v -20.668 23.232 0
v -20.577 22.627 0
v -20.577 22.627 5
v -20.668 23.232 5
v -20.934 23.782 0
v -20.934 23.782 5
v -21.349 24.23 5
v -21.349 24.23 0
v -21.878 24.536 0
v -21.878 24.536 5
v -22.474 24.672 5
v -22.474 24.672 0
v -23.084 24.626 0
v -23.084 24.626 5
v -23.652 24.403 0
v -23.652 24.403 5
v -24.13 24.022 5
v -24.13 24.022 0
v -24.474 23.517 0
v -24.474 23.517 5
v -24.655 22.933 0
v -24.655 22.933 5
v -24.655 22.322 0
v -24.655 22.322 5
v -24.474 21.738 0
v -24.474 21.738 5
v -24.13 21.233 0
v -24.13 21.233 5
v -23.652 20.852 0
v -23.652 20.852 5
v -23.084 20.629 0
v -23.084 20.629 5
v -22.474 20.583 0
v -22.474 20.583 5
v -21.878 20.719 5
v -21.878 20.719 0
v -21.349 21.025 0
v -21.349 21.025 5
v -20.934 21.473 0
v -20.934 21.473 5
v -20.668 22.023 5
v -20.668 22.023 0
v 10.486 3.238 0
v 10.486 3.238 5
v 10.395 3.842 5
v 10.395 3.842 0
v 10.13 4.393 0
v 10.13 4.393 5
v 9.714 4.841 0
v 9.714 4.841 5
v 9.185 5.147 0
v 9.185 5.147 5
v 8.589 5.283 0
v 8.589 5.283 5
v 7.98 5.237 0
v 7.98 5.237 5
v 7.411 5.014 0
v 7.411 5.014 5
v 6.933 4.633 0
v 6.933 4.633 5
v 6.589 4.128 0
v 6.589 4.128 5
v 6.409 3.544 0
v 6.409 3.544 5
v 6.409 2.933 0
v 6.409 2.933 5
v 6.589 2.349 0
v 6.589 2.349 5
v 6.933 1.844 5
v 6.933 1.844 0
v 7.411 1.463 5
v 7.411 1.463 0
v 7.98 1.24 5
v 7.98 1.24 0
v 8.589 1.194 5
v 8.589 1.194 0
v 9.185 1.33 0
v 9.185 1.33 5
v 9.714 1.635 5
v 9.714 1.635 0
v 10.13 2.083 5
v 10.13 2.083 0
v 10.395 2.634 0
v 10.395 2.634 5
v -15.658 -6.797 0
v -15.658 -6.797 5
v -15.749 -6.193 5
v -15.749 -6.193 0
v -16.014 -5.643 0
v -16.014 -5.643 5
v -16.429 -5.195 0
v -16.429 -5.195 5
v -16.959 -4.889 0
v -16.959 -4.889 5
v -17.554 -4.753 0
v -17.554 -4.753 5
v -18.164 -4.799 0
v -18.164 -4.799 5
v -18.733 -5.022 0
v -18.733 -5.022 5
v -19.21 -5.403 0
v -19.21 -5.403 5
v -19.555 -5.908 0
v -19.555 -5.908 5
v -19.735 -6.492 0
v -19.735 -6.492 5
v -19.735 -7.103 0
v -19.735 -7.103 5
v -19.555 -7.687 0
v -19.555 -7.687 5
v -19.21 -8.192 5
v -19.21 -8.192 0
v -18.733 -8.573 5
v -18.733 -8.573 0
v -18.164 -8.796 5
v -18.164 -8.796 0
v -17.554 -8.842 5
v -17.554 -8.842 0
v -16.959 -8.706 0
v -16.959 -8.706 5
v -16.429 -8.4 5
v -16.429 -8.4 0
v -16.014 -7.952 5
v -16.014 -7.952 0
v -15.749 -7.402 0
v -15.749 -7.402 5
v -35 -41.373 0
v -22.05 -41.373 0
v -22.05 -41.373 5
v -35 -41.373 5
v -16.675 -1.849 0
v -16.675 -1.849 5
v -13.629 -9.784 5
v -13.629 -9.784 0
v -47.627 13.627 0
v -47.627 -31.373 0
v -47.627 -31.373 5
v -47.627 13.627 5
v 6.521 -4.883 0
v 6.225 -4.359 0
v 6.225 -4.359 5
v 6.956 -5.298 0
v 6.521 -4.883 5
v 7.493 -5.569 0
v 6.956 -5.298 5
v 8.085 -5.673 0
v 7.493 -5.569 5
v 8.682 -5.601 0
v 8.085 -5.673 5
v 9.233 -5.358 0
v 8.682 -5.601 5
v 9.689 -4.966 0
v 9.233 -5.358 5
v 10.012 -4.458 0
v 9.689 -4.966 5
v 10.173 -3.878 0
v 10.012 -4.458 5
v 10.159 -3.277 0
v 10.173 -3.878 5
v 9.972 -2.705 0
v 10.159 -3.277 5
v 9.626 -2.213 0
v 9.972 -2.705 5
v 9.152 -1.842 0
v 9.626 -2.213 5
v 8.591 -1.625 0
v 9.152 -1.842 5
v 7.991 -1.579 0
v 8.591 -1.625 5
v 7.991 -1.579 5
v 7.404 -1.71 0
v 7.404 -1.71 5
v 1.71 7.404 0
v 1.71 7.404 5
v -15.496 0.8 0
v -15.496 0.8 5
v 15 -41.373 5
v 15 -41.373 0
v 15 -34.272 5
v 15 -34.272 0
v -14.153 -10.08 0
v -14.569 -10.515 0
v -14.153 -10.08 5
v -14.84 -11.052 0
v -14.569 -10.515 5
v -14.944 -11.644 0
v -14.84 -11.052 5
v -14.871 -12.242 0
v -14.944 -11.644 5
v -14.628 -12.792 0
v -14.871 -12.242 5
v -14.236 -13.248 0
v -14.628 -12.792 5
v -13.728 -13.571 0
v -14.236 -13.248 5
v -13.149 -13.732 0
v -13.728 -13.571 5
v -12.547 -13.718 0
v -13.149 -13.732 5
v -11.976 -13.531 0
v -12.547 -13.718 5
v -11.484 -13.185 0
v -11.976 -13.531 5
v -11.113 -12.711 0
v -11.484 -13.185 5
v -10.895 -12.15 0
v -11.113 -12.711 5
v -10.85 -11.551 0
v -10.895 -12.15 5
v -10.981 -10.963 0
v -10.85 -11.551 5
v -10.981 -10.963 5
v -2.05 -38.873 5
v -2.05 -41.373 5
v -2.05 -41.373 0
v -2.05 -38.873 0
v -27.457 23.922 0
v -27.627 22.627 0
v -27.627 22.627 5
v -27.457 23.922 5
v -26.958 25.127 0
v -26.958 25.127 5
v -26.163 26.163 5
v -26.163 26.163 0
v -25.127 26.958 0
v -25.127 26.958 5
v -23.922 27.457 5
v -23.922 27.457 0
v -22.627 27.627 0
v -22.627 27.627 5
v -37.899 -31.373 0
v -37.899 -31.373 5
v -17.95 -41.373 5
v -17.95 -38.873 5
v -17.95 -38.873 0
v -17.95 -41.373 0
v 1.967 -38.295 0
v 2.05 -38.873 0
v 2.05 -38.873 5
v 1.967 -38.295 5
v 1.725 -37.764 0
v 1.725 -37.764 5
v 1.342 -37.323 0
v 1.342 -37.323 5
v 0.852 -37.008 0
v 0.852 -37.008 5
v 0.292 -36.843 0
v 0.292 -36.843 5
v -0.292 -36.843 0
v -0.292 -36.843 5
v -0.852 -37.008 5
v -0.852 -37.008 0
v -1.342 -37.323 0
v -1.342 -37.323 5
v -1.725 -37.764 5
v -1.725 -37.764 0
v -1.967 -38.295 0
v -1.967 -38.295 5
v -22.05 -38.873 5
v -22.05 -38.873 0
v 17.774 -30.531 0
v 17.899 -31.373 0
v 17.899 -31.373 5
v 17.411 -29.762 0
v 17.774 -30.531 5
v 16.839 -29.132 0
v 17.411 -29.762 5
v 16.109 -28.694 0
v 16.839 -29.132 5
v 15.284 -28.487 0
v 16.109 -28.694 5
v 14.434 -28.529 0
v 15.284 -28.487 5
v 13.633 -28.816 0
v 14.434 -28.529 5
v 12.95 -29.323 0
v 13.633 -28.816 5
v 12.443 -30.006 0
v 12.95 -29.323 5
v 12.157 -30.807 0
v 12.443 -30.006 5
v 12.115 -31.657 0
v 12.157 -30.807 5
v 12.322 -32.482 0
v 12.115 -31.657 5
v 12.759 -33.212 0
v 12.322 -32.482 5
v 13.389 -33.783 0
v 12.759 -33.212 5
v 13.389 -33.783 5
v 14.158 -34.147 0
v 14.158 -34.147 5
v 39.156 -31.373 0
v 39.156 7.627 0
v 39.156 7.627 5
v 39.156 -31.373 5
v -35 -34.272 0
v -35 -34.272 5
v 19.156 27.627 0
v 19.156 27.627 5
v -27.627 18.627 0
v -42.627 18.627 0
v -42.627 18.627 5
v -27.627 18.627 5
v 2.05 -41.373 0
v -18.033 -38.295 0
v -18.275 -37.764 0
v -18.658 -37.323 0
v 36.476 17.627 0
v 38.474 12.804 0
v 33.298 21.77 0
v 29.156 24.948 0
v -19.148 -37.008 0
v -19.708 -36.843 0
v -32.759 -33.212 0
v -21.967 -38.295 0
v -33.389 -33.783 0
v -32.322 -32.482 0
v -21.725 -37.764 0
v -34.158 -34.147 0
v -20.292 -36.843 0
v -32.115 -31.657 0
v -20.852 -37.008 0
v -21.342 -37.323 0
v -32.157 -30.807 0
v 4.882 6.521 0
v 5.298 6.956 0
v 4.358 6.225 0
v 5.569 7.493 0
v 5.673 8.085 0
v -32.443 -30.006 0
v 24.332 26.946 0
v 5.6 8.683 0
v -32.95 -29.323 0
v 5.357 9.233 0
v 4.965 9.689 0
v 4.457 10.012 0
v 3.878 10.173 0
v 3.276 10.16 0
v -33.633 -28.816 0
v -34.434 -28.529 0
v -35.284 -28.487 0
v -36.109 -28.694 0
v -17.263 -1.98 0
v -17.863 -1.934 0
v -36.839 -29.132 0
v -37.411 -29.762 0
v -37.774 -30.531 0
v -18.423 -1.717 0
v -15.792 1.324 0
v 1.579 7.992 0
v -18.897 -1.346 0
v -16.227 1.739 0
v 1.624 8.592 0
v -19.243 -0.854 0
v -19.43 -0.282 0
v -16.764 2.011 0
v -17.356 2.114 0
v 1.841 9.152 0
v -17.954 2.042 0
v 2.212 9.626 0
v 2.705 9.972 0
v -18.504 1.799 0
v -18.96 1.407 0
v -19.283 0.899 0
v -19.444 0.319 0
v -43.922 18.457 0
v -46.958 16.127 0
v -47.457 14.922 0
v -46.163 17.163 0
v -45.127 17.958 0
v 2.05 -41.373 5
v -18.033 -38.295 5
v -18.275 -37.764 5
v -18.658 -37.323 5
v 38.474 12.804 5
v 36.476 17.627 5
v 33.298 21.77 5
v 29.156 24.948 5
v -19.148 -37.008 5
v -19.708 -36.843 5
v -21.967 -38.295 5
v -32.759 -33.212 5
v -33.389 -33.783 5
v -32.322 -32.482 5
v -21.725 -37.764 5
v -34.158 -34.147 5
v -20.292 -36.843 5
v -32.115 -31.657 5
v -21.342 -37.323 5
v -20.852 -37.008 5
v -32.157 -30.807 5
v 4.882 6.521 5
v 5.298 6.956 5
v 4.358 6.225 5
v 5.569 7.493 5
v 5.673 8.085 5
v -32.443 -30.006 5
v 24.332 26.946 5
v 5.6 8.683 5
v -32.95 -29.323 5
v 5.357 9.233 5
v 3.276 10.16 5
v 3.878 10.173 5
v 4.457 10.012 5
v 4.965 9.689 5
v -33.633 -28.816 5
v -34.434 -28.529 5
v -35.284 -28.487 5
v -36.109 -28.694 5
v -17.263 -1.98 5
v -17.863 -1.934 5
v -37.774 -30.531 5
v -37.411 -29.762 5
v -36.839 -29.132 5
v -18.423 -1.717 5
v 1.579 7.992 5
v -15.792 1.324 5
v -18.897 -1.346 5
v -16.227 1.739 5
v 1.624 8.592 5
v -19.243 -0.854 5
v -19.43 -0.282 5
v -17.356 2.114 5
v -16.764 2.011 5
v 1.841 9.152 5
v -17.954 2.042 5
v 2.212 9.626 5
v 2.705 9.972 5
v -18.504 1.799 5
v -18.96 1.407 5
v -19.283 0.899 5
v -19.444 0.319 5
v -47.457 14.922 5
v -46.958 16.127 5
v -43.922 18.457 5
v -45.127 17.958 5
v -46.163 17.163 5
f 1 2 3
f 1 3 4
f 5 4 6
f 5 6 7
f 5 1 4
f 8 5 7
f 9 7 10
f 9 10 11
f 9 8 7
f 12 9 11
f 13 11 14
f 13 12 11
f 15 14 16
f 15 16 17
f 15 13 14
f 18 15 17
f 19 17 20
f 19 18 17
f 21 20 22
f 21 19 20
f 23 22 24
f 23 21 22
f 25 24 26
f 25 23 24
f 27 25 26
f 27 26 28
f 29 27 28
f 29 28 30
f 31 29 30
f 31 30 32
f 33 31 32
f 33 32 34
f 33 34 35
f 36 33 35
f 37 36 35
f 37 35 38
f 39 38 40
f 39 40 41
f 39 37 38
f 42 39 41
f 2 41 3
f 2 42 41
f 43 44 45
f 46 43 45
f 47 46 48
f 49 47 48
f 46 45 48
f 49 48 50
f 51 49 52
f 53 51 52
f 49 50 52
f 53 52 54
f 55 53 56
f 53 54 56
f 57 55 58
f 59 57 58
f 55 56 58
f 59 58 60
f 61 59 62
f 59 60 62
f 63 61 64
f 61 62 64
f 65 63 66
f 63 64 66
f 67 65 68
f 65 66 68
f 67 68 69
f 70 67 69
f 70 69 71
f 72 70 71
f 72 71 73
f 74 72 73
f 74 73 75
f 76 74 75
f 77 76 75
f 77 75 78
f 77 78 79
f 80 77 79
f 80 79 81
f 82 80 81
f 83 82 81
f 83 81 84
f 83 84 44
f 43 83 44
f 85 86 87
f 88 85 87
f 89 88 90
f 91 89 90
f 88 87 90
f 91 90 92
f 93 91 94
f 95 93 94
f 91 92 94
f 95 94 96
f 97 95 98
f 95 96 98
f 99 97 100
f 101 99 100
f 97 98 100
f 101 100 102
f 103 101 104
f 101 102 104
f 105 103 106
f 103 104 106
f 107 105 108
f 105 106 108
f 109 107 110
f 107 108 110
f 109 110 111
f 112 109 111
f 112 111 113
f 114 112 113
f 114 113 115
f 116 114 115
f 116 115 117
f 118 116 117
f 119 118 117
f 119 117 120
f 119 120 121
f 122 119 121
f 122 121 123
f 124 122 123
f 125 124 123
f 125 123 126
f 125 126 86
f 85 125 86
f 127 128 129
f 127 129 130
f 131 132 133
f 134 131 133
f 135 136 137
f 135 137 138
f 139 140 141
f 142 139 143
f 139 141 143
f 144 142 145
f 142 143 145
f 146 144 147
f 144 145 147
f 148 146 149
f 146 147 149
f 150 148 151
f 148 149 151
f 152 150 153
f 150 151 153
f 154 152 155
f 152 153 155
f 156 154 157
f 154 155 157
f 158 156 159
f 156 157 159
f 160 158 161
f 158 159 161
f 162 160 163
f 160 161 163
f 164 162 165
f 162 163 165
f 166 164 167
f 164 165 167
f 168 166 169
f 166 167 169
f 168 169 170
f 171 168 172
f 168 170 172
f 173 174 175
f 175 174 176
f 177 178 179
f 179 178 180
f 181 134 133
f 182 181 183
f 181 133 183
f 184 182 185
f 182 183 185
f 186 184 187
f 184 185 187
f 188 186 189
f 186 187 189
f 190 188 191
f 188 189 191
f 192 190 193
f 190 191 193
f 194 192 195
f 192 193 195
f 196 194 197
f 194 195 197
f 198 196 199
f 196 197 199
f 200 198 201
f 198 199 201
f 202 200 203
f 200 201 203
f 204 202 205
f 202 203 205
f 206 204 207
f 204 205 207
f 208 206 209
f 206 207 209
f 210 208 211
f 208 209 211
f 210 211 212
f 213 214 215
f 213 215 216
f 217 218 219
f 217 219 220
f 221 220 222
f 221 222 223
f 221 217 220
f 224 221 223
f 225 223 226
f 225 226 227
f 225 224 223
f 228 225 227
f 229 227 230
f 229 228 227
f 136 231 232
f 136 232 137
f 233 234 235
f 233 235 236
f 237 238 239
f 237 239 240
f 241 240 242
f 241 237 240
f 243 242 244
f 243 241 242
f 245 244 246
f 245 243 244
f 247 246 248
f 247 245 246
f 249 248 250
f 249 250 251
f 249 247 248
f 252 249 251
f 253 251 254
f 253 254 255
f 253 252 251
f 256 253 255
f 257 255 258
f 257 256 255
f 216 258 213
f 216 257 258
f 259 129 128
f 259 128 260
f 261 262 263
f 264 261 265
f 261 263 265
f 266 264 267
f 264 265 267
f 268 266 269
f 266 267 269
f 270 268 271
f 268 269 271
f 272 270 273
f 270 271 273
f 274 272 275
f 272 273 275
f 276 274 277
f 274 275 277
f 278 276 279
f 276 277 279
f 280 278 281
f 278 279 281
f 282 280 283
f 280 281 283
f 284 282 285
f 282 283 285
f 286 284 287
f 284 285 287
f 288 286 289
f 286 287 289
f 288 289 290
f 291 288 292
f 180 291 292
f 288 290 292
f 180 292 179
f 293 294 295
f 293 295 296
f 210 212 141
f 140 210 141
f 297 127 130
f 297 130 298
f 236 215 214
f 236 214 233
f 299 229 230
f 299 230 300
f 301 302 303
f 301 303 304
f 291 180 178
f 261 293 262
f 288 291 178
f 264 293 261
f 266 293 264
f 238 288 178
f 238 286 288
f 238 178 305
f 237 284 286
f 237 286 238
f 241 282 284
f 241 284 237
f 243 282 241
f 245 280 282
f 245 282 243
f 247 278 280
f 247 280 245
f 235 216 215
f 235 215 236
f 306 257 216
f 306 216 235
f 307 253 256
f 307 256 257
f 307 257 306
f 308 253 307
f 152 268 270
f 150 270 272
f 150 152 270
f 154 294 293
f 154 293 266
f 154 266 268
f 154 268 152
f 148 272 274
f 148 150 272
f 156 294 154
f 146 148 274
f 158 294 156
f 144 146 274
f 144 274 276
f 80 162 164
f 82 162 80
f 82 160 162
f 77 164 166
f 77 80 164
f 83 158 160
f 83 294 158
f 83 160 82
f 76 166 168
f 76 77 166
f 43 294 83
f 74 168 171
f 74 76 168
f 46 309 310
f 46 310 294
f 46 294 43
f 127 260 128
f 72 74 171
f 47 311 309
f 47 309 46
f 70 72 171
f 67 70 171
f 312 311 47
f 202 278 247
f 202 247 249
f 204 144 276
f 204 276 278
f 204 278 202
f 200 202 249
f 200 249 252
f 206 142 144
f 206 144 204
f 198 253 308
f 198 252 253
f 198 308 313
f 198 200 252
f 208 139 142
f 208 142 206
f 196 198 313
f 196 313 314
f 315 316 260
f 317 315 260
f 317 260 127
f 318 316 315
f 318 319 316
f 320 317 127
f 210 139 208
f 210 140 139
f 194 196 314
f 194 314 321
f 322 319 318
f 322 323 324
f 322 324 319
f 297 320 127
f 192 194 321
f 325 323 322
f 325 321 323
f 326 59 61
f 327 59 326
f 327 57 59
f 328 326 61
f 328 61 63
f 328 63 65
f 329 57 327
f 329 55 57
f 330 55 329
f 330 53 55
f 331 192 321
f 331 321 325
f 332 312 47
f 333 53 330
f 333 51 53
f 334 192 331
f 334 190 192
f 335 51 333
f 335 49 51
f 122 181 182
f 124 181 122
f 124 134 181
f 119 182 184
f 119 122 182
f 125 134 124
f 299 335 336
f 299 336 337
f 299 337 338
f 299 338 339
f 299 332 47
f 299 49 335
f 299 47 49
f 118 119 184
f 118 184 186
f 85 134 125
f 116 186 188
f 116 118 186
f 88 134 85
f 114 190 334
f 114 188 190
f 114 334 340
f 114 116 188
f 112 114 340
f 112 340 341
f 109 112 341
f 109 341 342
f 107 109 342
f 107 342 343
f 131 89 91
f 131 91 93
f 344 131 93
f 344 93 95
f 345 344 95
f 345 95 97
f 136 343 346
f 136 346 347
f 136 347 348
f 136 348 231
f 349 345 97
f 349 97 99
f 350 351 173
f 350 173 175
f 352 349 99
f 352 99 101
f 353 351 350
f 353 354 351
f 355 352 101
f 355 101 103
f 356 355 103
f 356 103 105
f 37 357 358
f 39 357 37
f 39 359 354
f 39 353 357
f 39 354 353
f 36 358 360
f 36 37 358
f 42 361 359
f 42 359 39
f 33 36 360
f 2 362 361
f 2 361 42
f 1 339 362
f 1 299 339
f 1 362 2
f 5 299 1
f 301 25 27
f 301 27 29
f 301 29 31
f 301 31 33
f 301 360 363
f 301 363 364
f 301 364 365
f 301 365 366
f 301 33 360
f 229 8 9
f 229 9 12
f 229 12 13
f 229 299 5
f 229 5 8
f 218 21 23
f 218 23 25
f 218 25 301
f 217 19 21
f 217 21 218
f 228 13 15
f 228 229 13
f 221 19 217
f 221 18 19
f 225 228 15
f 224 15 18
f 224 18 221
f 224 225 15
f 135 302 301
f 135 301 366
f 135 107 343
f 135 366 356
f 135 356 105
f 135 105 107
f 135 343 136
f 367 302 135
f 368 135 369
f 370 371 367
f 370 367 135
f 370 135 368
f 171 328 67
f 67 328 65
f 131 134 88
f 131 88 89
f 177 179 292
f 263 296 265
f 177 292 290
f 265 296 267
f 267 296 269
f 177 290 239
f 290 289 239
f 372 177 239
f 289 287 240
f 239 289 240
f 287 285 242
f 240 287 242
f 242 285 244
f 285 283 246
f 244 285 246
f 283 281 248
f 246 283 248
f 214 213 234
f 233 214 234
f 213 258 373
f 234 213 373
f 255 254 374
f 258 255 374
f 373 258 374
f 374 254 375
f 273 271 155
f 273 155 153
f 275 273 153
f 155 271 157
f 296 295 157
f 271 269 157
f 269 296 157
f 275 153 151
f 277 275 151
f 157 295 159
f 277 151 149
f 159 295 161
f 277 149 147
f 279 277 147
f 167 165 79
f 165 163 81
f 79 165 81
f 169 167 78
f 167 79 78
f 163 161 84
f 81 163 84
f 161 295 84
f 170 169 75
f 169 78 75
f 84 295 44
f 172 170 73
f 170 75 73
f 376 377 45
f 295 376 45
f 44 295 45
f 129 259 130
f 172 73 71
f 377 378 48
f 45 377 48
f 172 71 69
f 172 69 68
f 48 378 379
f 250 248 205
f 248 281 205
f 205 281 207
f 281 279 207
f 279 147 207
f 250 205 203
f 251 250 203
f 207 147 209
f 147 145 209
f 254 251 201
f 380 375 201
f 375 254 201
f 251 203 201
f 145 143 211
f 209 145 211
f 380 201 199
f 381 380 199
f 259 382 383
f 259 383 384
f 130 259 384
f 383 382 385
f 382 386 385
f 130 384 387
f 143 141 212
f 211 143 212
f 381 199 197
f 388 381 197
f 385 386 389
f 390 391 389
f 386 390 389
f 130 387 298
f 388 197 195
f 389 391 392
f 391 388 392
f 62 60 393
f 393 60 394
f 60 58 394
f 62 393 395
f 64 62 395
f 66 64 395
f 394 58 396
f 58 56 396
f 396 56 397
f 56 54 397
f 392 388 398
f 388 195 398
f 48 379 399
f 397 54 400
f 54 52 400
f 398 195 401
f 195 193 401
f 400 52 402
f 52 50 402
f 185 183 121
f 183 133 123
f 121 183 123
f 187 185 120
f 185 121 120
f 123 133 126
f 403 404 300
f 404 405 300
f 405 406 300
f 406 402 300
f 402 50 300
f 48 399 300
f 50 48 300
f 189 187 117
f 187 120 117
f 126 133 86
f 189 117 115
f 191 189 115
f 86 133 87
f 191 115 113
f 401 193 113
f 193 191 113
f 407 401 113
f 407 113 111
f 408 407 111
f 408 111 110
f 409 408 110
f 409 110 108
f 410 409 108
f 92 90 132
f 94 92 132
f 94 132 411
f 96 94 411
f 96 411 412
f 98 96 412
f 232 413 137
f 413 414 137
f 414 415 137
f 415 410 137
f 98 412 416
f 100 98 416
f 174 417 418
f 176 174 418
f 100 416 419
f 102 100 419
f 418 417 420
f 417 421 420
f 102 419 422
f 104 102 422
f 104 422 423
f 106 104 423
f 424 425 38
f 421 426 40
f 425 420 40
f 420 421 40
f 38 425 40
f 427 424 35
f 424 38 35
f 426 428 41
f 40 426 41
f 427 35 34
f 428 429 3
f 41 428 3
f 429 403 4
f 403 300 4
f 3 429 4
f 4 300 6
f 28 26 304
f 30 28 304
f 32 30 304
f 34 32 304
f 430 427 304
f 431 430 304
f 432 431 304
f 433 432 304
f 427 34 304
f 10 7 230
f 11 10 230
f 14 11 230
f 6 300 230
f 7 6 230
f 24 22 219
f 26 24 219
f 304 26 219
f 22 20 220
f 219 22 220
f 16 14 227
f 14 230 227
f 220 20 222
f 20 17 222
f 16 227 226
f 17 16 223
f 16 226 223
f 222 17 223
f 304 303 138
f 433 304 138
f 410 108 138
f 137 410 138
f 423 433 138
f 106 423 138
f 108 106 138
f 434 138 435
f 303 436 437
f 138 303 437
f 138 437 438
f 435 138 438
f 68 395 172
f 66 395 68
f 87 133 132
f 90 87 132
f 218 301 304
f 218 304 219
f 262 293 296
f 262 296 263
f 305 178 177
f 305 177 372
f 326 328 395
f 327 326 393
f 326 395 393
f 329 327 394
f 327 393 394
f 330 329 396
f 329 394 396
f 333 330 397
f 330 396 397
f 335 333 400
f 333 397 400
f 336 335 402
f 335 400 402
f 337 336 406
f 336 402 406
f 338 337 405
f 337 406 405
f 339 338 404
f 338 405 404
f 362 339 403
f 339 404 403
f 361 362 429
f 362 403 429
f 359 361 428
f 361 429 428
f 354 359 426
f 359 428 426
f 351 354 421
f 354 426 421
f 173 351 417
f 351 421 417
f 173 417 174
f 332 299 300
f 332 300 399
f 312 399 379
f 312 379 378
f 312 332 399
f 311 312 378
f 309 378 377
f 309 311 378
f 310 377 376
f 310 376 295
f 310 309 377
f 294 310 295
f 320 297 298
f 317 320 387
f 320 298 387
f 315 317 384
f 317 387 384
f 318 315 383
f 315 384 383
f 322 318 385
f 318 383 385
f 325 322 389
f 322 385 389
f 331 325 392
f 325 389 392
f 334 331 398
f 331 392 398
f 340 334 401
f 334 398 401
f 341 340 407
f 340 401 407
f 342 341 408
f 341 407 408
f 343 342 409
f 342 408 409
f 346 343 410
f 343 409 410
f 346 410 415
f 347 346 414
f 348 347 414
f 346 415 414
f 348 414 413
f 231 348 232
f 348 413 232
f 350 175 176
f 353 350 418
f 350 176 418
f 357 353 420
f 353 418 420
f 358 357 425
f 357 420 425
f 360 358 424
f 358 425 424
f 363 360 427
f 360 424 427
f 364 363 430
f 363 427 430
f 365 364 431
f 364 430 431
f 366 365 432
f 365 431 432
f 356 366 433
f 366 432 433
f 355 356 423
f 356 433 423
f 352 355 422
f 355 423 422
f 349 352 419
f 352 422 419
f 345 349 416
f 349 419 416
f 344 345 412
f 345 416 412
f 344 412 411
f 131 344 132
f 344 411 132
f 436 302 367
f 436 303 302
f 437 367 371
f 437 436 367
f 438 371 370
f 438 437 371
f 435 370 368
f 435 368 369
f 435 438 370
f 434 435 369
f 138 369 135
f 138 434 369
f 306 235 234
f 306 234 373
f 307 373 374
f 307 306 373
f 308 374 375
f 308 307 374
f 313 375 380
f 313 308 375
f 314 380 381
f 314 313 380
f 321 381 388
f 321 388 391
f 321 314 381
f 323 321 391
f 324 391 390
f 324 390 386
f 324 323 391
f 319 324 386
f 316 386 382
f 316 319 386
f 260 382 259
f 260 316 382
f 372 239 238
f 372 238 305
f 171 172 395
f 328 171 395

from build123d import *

# Parameters (mm, degrees)
SCHIZZO1_R                   = 2.5
SCHIZZO1_R_2                 = 2.05
ESTRUSIONE_ESTRUSIONE1_DEPTH = 5
SCHIZZO2_R                   = 2.05
TAGLIO_ESTRUSIONE1_DEPTH     = 6
CROQUIS1_W                   = 24.155603231
CROQUIS1_H                   = 18.627416998
CORTAR_EXTRUIR1_DEPTH        = 10
FILLET1_R                    = 5
CUT_EXTRUDE1_REACH           = 7
SKETCH1_R                    = 2.899137803
CUT_EXTRUDE2_REACH           = 7
SKETCH2_R                    = 2.05


with BuildPart() as part:
    # Schizzo1 → Estrusione-Estrusione1 (new body)
    with BuildSketch(Plane.XY):
        with BuildLine():
            Line((39.155603231, -41.372583002), (-35, -41.372583002))
            Line((-35, -41.372583002), (-35, -31.372583002))
            Line((-35, -31.372583002), (-47.627416998, -31.372583002))
            Line((-47.627416998, -31.372583002), (-47.627416998, 18.627416998))
            Line((-47.627416998, 18.627416998), (-27.627416998, 18.627416998))
            Line((-27.627416998, 18.627416998), (-27.627416998, 22.627416998))
            ThreePointArc((-27.627416998, 22.627416998), (-26.162950904, 26.162950904), (-22.627416998, 27.627416998))
            Line((-22.627416998, 27.627416998), (19.155603231, 27.627416998))
            ThreePointArc((19.155603231, 27.627416998), (33.297738855, 21.769552622), (39.155603231, 7.627416998))
            Line((39.155603231, 7.627416998), (39.155603231, -41.372583002))
        make_face()
        Circle(SCHIZZO1_R, mode=Mode.SUBTRACT)
        with Locations((-20, -38.872583002)):
            Circle(SCHIZZO1_R_2, mode=Mode.SUBTRACT)
        with Locations((0, -38.872583002)):
            Circle(SCHIZZO1_R_2, mode=Mode.SUBTRACT)
        with Locations((-22.627416998, 22.627416998)):
            Circle(SCHIZZO1_R_2, mode=Mode.SUBTRACT)
    extrude(amount=ESTRUSIONE_ESTRUSIONE1_DEPTH)

    # Schizzo2 → Taglio-Estrusione1 (cut, through all)
    with BuildSketch(Plane.XY.offset(5)):
        with Locations((-17.707593382, -6.797308246)):
            Circle(SCHIZZO2_R)
        with Locations((8.435926092, 3.238248629)):
            Circle(SCHIZZO2_R)
        Polygon((-12.894665672, -11.698011855), (8.138901337, -3.623981952), (3.623465173, 8.139131422), (-17.410101836, 0.065101519), align=None)
    extrude(amount=-TAGLIO_ESTRUSIONE1_DEPTH, mode=Mode.SUBTRACT)

    # Croquis1 → Cortar-Extruir1 (cut)
    with BuildSketch(Plane(origin=(0, 0, 0), x_dir=(-1, 0, 0), z_dir=(0, 0, -1))):
        with Locations((-27.077801616, -40.686291501)):
            Rectangle(CROQUIS1_W, CROQUIS1_H)
    extrude(amount=-CORTAR_EXTRUIR1_DEPTH, mode=Mode.SUBTRACT)

    # Fillet1
    fillet1_edges = [part.edges().sort_by_distance(p)[0] for p in [
        (-47.627416998, 18.627416998, 2.5),
    ]]
    fillet(fillet1_edges, radius=FILLET1_R)

    # Sketch1 → Cut-Extrude1 (cut, up to next)
    with BuildSketch(Plane.XY.offset(5), mode=Mode.PRIVATE) as cut_extrude1_sk1:
        with Locations((-35, -31.372583002)):
            Circle(SKETCH1_R)
    cut_extrude1_tool1 = extrude(cut_extrude1_sk1.sketch, amount=-CUT_EXTRUDE1_REACH, mode=Mode.PRIVATE) & part.part
    add(cut_extrude1_tool1.solids().sort_by_distance((-35, -31.372583, 5))[0], mode=Mode.SUBTRACT)
    # Sketch1 → Cut-Extrude1 (cut, up to next)
    with BuildSketch(Plane.XY.offset(5), mode=Mode.PRIVATE) as cut_extrude1_sk2:
        with Locations((15, -31.372583002)):
            Circle(SKETCH1_R)
    cut_extrude1_tool2 = extrude(cut_extrude1_sk2.sketch, amount=-CUT_EXTRUDE1_REACH, mode=Mode.PRIVATE) & part.part
    add(cut_extrude1_tool2.solids().sort_by_distance((15, -31.372583, 5))[0], mode=Mode.SUBTRACT)
    # Sketch1 → Cut-Extrude1 (cut, up to next)
    with BuildSketch(Plane.XY.offset(5), mode=Mode.PRIVATE) as cut_extrude1_sk3:
        with BuildLine():
            Line((-17.95, -38.872583002), (-17.95, -41.372583002))
            ThreePointArc((-17.95, -41.372583002), (-20, -43.422583002), (-22.05, -41.372583002))
            Line((-22.05, -41.372583002), (-22.05, -38.872583002))
            ThreePointArc((-22.05, -38.872583002), (-20, -36.822583002), (-17.95, -38.872583002))
        make_face()
    cut_extrude1_tool3 = extrude(cut_extrude1_sk3.sketch, amount=-CUT_EXTRUDE1_REACH, mode=Mode.PRIVATE) & part.part
    add(cut_extrude1_tool3.solids().sort_by_distance((-20, -40.122583, 5))[0], mode=Mode.SUBTRACT)
    # Sketch1 → Cut-Extrude1 (cut, up to next)
    with BuildSketch(Plane.XY.offset(5), mode=Mode.PRIVATE) as cut_extrude1_sk4:
        with BuildLine():
            Line((2.05, -38.872583002), (2.05, -41.372583002))
            ThreePointArc((2.05, -41.372583002), (0, -43.422583002), (-2.05, -41.372583002))
            Line((-2.05, -41.372583002), (-2.05, -38.872583002))
            ThreePointArc((-2.05, -38.872583002), (0, -36.822583002), (2.05, -38.872583002))
        make_face()
    cut_extrude1_tool4 = extrude(cut_extrude1_sk4.sketch, amount=-CUT_EXTRUDE1_REACH, mode=Mode.PRIVATE) & part.part
    add(cut_extrude1_tool4.solids().sort_by_distance((0, -40.122583, 5))[0], mode=Mode.SUBTRACT)

    # Sketch2 → Cut-Extrude2 (cut, up to next)
    with BuildSketch(Plane.XY.offset(5), mode=Mode.PRIVATE) as cut_extrude2_sk1:
        with Locations((-12.894665672, -11.698011855)):
            Circle(SKETCH2_R)
    cut_extrude2_tool1 = extrude(cut_extrude2_sk1.sketch, amount=-CUT_EXTRUDE2_REACH, mode=Mode.PRIVATE) & part.part
    add(cut_extrude2_tool1.solids().sort_by_distance((-12.894666, -11.698012, 5))[0], mode=Mode.SUBTRACT)
    # Sketch2 → Cut-Extrude2 (cut, up to next)
    with BuildSketch(Plane.XY.offset(5), mode=Mode.PRIVATE) as cut_extrude2_sk2:
        with Locations((8.138901337, -3.623981952)):
            Circle(SKETCH2_R)
    cut_extrude2_tool2 = extrude(cut_extrude2_sk2.sketch, amount=-CUT_EXTRUDE2_REACH, mode=Mode.PRIVATE) & part.part
    add(cut_extrude2_tool2.solids().sort_by_distance((8.138901, -3.623982, 5))[0], mode=Mode.SUBTRACT)
    # Sketch2 → Cut-Extrude2 (cut, up to next)
    with BuildSketch(Plane.XY.offset(5), mode=Mode.PRIVATE) as cut_extrude2_sk3:
        with Locations((3.623465173, 8.139131422)):
            Circle(SKETCH2_R)
    cut_extrude2_tool3 = extrude(cut_extrude2_sk3.sketch, amount=-CUT_EXTRUDE2_REACH, mode=Mode.PRIVATE) & part.part
    add(cut_extrude2_tool3.solids().sort_by_distance((3.623465, 8.139131, 5))[0], mode=Mode.SUBTRACT)
    # Sketch2 → Cut-Extrude2 (cut, up to next)
    with BuildSketch(Plane.XY.offset(5), mode=Mode.PRIVATE) as cut_extrude2_sk4:
        with Locations((-17.410101836, 0.065101519)):
            Circle(SKETCH2_R)
    cut_extrude2_tool4 = extrude(cut_extrude2_sk4.sketch, amount=-CUT_EXTRUDE2_REACH, mode=Mode.PRIVATE) & part.part
    add(cut_extrude2_tool4.solids().sort_by_distance((-17.410102, 0.065102, 5))[0], mode=Mode.SUBTRACT)


solid = part.part
